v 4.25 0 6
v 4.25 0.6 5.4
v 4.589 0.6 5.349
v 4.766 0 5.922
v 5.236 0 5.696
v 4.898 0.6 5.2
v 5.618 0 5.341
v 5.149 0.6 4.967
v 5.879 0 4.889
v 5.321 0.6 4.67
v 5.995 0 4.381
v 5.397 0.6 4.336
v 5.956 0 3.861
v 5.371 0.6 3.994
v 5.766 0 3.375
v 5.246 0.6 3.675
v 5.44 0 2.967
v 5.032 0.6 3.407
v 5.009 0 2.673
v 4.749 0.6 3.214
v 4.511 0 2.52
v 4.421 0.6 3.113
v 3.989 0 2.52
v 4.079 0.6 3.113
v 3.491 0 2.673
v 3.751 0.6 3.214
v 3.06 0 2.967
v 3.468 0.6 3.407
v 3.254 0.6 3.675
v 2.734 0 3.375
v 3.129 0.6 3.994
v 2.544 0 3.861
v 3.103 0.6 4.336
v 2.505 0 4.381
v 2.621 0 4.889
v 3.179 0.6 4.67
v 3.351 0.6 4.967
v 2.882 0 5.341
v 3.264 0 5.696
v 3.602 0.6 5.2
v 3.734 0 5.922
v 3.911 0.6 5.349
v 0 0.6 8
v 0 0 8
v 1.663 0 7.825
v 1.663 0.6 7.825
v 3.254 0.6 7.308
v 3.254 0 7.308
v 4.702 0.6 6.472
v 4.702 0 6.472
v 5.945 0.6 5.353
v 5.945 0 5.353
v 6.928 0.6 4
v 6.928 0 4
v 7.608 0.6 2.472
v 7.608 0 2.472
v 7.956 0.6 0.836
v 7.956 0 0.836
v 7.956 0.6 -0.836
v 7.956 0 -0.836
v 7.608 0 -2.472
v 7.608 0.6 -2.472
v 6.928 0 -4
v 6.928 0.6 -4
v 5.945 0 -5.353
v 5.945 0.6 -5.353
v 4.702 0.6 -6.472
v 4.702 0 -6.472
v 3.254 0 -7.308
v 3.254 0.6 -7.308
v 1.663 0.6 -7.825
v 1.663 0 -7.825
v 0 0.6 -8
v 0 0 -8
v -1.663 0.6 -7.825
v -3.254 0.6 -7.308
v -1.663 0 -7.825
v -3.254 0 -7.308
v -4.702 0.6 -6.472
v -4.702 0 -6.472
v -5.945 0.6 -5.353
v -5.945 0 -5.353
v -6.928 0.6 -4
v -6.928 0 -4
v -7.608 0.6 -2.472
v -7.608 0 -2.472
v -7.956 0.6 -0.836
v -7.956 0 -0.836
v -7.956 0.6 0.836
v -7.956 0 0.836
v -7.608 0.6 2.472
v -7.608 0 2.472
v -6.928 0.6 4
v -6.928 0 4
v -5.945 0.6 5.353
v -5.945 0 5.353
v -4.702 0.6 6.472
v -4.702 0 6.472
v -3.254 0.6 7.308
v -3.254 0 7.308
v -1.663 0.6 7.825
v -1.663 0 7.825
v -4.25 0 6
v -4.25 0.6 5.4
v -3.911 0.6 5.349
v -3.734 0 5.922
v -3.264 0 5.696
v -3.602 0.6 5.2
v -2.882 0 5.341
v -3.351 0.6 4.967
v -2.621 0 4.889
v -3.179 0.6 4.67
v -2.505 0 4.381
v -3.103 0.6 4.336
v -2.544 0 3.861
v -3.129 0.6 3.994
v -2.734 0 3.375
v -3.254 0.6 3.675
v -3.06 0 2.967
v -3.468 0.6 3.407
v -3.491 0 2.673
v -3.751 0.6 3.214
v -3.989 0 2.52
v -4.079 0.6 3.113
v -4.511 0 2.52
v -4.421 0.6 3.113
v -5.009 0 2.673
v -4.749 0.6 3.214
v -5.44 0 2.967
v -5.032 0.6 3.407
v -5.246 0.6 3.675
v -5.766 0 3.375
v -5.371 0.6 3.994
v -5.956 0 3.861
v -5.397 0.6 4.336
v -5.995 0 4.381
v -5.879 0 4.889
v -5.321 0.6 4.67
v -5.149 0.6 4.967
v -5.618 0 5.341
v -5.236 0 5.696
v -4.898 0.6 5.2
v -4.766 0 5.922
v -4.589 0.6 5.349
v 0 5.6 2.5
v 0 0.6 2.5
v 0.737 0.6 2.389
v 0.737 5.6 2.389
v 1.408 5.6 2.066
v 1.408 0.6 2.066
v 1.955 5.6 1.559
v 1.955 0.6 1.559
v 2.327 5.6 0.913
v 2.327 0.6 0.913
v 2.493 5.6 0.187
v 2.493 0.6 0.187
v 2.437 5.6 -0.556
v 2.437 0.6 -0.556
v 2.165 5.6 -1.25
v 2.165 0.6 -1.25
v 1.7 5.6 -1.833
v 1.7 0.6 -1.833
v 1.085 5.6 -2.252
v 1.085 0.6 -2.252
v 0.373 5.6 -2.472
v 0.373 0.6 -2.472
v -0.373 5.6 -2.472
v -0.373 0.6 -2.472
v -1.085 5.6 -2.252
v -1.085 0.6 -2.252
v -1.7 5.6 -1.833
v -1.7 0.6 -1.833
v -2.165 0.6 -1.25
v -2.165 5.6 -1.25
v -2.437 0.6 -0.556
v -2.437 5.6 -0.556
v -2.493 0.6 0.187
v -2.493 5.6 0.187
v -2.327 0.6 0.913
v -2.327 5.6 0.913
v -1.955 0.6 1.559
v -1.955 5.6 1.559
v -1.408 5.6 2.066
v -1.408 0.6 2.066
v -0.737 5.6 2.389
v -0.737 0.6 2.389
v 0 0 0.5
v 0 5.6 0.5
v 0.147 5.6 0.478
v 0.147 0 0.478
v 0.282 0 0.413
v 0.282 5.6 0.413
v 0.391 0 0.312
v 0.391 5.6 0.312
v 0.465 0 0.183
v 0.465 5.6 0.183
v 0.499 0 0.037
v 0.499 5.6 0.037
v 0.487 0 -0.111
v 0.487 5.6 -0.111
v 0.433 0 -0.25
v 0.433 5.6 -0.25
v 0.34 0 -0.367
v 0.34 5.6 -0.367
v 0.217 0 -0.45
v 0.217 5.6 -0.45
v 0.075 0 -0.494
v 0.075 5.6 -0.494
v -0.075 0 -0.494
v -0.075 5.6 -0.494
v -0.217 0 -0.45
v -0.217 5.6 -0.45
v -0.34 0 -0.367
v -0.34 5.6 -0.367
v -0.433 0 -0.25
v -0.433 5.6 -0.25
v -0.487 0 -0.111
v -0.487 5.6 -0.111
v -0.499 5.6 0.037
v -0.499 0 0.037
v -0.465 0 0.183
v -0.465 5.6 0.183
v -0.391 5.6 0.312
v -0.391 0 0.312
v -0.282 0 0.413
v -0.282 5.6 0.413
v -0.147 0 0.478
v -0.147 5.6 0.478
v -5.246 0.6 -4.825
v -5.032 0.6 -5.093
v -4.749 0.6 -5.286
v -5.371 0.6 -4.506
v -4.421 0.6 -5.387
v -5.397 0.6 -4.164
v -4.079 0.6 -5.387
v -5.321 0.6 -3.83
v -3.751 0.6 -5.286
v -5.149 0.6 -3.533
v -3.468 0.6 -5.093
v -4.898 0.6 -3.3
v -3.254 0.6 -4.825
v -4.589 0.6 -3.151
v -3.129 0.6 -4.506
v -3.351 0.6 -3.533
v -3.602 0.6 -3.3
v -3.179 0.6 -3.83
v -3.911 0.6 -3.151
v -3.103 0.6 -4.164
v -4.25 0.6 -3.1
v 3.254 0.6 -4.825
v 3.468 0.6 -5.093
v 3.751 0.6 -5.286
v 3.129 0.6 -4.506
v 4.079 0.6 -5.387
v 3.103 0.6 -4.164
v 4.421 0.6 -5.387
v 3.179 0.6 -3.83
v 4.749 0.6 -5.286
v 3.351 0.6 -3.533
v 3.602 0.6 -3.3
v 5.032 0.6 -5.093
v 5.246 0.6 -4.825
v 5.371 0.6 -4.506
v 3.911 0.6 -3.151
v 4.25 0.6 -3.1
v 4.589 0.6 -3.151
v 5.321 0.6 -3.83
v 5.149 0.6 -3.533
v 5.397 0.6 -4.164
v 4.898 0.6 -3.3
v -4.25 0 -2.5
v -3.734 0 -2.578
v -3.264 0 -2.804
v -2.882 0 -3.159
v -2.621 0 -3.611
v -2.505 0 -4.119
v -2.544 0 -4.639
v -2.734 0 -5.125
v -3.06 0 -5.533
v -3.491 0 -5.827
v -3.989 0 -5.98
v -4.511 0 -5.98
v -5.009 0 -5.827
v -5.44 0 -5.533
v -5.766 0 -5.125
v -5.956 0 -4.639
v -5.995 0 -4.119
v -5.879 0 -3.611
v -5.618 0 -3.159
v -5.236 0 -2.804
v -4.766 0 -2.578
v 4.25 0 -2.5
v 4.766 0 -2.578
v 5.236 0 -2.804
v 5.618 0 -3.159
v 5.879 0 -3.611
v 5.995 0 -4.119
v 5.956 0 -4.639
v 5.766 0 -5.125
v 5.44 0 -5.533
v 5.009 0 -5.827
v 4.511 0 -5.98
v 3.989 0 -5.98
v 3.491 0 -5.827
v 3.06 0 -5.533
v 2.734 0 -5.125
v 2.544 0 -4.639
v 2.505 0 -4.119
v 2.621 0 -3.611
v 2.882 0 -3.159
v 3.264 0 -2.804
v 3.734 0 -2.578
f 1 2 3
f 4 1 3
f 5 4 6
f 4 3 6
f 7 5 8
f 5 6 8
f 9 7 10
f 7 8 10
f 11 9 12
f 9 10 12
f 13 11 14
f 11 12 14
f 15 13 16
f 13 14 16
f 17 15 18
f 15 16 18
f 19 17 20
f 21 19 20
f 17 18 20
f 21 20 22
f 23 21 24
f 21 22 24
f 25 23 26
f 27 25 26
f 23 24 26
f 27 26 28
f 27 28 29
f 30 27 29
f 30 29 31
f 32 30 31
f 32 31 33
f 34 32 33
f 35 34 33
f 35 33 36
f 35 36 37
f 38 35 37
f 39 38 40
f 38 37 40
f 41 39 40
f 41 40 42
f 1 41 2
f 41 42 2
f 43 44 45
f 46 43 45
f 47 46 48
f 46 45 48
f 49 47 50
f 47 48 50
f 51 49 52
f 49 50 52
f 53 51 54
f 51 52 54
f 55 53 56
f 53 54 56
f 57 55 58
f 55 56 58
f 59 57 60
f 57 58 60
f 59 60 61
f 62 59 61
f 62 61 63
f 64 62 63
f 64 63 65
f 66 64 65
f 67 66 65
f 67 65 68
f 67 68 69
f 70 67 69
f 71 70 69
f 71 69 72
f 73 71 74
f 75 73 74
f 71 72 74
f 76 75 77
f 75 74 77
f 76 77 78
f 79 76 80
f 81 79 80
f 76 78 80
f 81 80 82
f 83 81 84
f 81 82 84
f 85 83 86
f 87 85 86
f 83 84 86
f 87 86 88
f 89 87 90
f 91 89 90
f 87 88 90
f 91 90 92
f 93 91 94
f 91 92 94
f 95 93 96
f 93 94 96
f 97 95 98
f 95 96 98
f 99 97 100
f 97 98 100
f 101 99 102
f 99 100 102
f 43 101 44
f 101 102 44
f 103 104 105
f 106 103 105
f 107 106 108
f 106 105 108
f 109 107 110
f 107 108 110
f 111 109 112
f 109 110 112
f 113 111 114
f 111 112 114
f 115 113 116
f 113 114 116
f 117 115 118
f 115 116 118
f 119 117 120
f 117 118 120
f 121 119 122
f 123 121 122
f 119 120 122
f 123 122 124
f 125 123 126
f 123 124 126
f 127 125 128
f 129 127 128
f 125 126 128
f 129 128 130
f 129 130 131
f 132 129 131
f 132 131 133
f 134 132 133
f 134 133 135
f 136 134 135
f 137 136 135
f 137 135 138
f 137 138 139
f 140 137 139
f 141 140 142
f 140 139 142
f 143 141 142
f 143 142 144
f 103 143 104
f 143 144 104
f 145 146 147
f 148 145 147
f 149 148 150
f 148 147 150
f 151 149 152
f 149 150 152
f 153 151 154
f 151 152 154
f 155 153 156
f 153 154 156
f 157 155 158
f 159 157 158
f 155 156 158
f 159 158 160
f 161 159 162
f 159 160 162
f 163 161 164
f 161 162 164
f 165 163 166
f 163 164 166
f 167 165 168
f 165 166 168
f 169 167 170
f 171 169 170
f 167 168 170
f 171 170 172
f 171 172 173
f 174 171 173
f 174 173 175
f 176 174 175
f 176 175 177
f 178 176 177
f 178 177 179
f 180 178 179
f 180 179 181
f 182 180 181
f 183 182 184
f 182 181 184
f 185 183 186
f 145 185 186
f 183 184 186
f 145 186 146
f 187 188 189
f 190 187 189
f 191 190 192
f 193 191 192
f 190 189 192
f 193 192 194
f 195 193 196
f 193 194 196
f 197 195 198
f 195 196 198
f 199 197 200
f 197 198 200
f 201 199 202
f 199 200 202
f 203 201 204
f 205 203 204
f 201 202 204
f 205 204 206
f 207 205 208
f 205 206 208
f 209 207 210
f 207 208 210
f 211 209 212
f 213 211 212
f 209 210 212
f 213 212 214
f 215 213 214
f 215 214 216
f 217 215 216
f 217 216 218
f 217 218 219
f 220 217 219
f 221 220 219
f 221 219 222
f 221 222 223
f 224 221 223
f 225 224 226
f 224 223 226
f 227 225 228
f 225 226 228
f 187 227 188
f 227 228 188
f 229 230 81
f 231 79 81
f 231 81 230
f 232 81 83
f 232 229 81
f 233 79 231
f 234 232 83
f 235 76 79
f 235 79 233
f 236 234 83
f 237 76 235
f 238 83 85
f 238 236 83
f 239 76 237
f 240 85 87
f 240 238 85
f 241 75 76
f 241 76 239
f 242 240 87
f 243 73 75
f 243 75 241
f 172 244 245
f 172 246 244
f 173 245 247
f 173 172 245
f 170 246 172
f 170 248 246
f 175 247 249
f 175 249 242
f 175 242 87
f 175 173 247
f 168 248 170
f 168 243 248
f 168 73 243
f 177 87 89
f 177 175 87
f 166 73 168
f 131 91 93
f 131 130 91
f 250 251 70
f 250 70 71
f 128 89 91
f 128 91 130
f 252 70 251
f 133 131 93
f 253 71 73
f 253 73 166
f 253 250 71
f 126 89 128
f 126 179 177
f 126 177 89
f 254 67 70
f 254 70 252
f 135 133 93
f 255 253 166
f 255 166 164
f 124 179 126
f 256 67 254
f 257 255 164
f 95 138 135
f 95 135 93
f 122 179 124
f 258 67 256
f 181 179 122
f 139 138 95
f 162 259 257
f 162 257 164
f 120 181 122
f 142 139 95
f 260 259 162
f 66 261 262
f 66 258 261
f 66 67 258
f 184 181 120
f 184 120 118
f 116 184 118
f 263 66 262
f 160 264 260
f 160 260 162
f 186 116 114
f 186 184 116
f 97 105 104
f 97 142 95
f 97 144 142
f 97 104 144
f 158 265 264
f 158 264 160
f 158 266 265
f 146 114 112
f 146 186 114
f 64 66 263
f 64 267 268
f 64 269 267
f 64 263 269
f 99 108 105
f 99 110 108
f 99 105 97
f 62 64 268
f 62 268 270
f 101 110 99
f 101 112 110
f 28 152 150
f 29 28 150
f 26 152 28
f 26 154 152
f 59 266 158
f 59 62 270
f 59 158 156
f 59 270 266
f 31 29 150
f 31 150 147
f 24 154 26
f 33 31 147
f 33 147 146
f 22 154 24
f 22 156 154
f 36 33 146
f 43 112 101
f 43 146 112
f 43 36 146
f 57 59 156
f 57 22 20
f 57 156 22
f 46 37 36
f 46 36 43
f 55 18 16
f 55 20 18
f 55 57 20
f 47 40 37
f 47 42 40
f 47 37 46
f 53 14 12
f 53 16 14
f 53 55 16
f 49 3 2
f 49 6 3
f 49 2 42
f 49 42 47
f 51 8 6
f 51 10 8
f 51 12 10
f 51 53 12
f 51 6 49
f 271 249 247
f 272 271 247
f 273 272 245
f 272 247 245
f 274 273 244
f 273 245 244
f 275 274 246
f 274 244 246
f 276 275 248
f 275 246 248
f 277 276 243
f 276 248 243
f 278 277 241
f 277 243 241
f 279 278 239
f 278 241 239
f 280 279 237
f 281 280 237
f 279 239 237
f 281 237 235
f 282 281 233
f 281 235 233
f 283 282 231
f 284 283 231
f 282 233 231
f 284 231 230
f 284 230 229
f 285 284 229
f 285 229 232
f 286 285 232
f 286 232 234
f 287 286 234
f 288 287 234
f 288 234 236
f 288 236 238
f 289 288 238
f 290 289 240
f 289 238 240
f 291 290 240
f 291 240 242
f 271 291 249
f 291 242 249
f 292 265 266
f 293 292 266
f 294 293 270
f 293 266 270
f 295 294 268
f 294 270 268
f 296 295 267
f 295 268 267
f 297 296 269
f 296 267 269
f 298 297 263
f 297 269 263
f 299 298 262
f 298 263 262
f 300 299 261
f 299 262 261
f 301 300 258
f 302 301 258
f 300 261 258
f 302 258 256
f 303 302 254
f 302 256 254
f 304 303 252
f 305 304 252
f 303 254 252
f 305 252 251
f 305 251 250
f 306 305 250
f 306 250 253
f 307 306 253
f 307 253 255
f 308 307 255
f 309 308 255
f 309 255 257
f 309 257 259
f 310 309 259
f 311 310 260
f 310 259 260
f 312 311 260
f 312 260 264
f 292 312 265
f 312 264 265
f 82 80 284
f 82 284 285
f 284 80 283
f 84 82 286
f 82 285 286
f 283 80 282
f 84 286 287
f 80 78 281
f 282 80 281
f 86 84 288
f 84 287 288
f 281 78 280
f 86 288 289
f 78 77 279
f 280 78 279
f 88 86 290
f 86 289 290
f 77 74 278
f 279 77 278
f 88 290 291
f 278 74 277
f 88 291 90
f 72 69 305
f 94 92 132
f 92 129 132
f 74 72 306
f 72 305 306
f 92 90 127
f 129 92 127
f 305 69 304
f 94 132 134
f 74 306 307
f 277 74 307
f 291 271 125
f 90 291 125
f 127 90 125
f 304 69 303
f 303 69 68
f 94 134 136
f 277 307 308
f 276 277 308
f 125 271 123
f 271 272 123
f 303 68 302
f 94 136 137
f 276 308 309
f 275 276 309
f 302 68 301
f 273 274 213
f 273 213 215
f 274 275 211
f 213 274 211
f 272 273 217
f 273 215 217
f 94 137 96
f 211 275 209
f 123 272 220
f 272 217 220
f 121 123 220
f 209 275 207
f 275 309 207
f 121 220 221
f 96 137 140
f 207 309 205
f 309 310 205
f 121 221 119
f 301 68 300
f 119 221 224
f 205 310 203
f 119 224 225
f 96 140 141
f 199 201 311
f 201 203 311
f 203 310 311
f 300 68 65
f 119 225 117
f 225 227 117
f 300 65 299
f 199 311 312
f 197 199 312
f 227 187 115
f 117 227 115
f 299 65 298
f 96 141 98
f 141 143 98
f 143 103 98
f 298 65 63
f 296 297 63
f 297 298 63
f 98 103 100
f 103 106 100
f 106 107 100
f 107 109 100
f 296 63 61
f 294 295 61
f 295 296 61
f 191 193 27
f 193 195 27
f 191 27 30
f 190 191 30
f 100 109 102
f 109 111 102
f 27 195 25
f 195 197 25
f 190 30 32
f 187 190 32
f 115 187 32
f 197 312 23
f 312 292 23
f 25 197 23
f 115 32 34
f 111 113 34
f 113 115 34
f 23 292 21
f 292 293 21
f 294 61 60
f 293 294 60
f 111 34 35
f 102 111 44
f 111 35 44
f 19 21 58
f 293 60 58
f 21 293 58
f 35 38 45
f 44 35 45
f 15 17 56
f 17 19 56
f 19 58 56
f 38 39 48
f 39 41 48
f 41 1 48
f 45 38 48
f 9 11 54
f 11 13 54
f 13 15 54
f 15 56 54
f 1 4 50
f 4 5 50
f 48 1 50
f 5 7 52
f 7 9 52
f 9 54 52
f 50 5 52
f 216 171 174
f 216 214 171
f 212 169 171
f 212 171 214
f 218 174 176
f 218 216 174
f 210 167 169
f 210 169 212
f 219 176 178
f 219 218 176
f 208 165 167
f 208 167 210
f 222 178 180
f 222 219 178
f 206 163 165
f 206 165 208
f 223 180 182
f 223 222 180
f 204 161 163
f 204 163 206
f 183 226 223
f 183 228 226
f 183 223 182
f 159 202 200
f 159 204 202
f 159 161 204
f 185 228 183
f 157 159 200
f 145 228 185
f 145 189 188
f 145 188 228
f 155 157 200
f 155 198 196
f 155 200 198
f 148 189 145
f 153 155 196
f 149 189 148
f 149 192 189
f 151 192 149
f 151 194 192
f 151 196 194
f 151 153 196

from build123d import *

# Parameters (mm, degrees)
ESQUISSE1_R             = 8
ESQUISSE1_R_2           = 1
BOSS_EXTRU_1_DEPTH      = 0.6
ESQUISSE2_R             = 2.5
BOSS_EXTRU_2_DEPTH      = 5
ESQUISSE3_R             = 0.5
ENL_V_MAT_EXTRU_1_DEPTH = 5.6
CHANFREIN1_SIZE         = 0.75


with BuildPart() as part:
    # Esquisse1 → Boss.-Extru.1 (new body)
    with BuildSketch(Plane(origin=(0, 0, 0), x_dir=(1, 0, 0), z_dir=(0, 1, 0))):
        with Locations(Location((0, 0, 0), (0, 0, 270))):
            Circle(ESQUISSE1_R)
        with Locations(Location((-4.25, 4.25, 0), (0, 0, 270))):
            Circle(ESQUISSE1_R_2, mode=Mode.SUBTRACT)
        with Locations(Location((4.25, 4.25, 0), (0, 0, 270))):
            Circle(ESQUISSE1_R_2, mode=Mode.SUBTRACT)
        with Locations(Location((4.25, -4.25, 0), (0, 0, 270))):
            Circle(ESQUISSE1_R_2, mode=Mode.SUBTRACT)
        with Locations(Location((-4.25, -4.25, 0), (0, 0, 270))):
            Circle(ESQUISSE1_R_2, mode=Mode.SUBTRACT)
    extrude(amount=BOSS_EXTRU_1_DEPTH)

    # Esquisse2 → Boss.-Extru.2 (add)
    with BuildSketch(Plane(origin=(0, 0.6, 0), x_dir=(1, 0, 0), z_dir=(0, 1, 0))):
        with Locations(Location((0, 0, 0), (0, 0, 270))):
            Circle(ESQUISSE2_R)
    extrude(amount=BOSS_EXTRU_2_DEPTH)

    # Esquisse3 → Enlèv. mat.-Extru.1 (cut)
    with BuildSketch(Plane(origin=(0, 5.6, 0), x_dir=(1, 0, 0), z_dir=(0, 1, 0))):
        with Locations(Location((0, 0, 0), (0, 0, 270))):
            Circle(ESQUISSE3_R)
    extrude(amount=-ENL_V_MAT_EXTRU_1_DEPTH, mode=Mode.SUBTRACT)

    # Chanfrein1
    # the kernel refuses this chamfer: 0.75 mm, written as the material it takes off along each edge
    with BuildSketch(Plane(origin=(4.25, 0, 4.25), x_dir=(0, 0, 1), z_dir=(-1, 0, 0))) as chanfrein1_piece_1:
        Polygon((1 + CHANFREIN1_SIZE, 0), (1, CHANFREIN1_SIZE), (1, 0), align=None)
    revolve(axis=Axis((4.25, 0, 4.25), (0, 1, 0)), mode=Mode.SUBTRACT)
    with BuildSketch(Plane(origin=(-4.25, 0, 4.25), x_dir=(0, 0, 1), z_dir=(-1, 0, 0))) as chanfrein1_piece_2:
        Polygon((1 + CHANFREIN1_SIZE, 0), (1, CHANFREIN1_SIZE), (1, 0), align=None)
    revolve(axis=Axis((-4.25, 0, 4.25), (0, 1, 0)), mode=Mode.SUBTRACT)
    with BuildSketch(Plane(origin=(-4.25, 0, -4.25), x_dir=(0, 0, 1), z_dir=(-1, 0, 0))) as chanfrein1_piece_3:
        Polygon((1 + CHANFREIN1_SIZE, 0), (1, CHANFREIN1_SIZE), (1, 0), align=None)
    revolve(axis=Axis((-4.25, 0, -4.25), (0, 1, 0)), mode=Mode.SUBTRACT)
    with BuildSketch(Plane(origin=(4.25, 0, -4.25), x_dir=(0, 0, 1), z_dir=(-1, 0, 0))) as chanfrein1_piece_4:
        Polygon((1 + CHANFREIN1_SIZE, 0), (1, CHANFREIN1_SIZE), (1, 0), align=None)
    revolve(axis=Axis((4.25, 0, -4.25), (0, 1, 0)), mode=Mode.SUBTRACT)


solid = part.part
